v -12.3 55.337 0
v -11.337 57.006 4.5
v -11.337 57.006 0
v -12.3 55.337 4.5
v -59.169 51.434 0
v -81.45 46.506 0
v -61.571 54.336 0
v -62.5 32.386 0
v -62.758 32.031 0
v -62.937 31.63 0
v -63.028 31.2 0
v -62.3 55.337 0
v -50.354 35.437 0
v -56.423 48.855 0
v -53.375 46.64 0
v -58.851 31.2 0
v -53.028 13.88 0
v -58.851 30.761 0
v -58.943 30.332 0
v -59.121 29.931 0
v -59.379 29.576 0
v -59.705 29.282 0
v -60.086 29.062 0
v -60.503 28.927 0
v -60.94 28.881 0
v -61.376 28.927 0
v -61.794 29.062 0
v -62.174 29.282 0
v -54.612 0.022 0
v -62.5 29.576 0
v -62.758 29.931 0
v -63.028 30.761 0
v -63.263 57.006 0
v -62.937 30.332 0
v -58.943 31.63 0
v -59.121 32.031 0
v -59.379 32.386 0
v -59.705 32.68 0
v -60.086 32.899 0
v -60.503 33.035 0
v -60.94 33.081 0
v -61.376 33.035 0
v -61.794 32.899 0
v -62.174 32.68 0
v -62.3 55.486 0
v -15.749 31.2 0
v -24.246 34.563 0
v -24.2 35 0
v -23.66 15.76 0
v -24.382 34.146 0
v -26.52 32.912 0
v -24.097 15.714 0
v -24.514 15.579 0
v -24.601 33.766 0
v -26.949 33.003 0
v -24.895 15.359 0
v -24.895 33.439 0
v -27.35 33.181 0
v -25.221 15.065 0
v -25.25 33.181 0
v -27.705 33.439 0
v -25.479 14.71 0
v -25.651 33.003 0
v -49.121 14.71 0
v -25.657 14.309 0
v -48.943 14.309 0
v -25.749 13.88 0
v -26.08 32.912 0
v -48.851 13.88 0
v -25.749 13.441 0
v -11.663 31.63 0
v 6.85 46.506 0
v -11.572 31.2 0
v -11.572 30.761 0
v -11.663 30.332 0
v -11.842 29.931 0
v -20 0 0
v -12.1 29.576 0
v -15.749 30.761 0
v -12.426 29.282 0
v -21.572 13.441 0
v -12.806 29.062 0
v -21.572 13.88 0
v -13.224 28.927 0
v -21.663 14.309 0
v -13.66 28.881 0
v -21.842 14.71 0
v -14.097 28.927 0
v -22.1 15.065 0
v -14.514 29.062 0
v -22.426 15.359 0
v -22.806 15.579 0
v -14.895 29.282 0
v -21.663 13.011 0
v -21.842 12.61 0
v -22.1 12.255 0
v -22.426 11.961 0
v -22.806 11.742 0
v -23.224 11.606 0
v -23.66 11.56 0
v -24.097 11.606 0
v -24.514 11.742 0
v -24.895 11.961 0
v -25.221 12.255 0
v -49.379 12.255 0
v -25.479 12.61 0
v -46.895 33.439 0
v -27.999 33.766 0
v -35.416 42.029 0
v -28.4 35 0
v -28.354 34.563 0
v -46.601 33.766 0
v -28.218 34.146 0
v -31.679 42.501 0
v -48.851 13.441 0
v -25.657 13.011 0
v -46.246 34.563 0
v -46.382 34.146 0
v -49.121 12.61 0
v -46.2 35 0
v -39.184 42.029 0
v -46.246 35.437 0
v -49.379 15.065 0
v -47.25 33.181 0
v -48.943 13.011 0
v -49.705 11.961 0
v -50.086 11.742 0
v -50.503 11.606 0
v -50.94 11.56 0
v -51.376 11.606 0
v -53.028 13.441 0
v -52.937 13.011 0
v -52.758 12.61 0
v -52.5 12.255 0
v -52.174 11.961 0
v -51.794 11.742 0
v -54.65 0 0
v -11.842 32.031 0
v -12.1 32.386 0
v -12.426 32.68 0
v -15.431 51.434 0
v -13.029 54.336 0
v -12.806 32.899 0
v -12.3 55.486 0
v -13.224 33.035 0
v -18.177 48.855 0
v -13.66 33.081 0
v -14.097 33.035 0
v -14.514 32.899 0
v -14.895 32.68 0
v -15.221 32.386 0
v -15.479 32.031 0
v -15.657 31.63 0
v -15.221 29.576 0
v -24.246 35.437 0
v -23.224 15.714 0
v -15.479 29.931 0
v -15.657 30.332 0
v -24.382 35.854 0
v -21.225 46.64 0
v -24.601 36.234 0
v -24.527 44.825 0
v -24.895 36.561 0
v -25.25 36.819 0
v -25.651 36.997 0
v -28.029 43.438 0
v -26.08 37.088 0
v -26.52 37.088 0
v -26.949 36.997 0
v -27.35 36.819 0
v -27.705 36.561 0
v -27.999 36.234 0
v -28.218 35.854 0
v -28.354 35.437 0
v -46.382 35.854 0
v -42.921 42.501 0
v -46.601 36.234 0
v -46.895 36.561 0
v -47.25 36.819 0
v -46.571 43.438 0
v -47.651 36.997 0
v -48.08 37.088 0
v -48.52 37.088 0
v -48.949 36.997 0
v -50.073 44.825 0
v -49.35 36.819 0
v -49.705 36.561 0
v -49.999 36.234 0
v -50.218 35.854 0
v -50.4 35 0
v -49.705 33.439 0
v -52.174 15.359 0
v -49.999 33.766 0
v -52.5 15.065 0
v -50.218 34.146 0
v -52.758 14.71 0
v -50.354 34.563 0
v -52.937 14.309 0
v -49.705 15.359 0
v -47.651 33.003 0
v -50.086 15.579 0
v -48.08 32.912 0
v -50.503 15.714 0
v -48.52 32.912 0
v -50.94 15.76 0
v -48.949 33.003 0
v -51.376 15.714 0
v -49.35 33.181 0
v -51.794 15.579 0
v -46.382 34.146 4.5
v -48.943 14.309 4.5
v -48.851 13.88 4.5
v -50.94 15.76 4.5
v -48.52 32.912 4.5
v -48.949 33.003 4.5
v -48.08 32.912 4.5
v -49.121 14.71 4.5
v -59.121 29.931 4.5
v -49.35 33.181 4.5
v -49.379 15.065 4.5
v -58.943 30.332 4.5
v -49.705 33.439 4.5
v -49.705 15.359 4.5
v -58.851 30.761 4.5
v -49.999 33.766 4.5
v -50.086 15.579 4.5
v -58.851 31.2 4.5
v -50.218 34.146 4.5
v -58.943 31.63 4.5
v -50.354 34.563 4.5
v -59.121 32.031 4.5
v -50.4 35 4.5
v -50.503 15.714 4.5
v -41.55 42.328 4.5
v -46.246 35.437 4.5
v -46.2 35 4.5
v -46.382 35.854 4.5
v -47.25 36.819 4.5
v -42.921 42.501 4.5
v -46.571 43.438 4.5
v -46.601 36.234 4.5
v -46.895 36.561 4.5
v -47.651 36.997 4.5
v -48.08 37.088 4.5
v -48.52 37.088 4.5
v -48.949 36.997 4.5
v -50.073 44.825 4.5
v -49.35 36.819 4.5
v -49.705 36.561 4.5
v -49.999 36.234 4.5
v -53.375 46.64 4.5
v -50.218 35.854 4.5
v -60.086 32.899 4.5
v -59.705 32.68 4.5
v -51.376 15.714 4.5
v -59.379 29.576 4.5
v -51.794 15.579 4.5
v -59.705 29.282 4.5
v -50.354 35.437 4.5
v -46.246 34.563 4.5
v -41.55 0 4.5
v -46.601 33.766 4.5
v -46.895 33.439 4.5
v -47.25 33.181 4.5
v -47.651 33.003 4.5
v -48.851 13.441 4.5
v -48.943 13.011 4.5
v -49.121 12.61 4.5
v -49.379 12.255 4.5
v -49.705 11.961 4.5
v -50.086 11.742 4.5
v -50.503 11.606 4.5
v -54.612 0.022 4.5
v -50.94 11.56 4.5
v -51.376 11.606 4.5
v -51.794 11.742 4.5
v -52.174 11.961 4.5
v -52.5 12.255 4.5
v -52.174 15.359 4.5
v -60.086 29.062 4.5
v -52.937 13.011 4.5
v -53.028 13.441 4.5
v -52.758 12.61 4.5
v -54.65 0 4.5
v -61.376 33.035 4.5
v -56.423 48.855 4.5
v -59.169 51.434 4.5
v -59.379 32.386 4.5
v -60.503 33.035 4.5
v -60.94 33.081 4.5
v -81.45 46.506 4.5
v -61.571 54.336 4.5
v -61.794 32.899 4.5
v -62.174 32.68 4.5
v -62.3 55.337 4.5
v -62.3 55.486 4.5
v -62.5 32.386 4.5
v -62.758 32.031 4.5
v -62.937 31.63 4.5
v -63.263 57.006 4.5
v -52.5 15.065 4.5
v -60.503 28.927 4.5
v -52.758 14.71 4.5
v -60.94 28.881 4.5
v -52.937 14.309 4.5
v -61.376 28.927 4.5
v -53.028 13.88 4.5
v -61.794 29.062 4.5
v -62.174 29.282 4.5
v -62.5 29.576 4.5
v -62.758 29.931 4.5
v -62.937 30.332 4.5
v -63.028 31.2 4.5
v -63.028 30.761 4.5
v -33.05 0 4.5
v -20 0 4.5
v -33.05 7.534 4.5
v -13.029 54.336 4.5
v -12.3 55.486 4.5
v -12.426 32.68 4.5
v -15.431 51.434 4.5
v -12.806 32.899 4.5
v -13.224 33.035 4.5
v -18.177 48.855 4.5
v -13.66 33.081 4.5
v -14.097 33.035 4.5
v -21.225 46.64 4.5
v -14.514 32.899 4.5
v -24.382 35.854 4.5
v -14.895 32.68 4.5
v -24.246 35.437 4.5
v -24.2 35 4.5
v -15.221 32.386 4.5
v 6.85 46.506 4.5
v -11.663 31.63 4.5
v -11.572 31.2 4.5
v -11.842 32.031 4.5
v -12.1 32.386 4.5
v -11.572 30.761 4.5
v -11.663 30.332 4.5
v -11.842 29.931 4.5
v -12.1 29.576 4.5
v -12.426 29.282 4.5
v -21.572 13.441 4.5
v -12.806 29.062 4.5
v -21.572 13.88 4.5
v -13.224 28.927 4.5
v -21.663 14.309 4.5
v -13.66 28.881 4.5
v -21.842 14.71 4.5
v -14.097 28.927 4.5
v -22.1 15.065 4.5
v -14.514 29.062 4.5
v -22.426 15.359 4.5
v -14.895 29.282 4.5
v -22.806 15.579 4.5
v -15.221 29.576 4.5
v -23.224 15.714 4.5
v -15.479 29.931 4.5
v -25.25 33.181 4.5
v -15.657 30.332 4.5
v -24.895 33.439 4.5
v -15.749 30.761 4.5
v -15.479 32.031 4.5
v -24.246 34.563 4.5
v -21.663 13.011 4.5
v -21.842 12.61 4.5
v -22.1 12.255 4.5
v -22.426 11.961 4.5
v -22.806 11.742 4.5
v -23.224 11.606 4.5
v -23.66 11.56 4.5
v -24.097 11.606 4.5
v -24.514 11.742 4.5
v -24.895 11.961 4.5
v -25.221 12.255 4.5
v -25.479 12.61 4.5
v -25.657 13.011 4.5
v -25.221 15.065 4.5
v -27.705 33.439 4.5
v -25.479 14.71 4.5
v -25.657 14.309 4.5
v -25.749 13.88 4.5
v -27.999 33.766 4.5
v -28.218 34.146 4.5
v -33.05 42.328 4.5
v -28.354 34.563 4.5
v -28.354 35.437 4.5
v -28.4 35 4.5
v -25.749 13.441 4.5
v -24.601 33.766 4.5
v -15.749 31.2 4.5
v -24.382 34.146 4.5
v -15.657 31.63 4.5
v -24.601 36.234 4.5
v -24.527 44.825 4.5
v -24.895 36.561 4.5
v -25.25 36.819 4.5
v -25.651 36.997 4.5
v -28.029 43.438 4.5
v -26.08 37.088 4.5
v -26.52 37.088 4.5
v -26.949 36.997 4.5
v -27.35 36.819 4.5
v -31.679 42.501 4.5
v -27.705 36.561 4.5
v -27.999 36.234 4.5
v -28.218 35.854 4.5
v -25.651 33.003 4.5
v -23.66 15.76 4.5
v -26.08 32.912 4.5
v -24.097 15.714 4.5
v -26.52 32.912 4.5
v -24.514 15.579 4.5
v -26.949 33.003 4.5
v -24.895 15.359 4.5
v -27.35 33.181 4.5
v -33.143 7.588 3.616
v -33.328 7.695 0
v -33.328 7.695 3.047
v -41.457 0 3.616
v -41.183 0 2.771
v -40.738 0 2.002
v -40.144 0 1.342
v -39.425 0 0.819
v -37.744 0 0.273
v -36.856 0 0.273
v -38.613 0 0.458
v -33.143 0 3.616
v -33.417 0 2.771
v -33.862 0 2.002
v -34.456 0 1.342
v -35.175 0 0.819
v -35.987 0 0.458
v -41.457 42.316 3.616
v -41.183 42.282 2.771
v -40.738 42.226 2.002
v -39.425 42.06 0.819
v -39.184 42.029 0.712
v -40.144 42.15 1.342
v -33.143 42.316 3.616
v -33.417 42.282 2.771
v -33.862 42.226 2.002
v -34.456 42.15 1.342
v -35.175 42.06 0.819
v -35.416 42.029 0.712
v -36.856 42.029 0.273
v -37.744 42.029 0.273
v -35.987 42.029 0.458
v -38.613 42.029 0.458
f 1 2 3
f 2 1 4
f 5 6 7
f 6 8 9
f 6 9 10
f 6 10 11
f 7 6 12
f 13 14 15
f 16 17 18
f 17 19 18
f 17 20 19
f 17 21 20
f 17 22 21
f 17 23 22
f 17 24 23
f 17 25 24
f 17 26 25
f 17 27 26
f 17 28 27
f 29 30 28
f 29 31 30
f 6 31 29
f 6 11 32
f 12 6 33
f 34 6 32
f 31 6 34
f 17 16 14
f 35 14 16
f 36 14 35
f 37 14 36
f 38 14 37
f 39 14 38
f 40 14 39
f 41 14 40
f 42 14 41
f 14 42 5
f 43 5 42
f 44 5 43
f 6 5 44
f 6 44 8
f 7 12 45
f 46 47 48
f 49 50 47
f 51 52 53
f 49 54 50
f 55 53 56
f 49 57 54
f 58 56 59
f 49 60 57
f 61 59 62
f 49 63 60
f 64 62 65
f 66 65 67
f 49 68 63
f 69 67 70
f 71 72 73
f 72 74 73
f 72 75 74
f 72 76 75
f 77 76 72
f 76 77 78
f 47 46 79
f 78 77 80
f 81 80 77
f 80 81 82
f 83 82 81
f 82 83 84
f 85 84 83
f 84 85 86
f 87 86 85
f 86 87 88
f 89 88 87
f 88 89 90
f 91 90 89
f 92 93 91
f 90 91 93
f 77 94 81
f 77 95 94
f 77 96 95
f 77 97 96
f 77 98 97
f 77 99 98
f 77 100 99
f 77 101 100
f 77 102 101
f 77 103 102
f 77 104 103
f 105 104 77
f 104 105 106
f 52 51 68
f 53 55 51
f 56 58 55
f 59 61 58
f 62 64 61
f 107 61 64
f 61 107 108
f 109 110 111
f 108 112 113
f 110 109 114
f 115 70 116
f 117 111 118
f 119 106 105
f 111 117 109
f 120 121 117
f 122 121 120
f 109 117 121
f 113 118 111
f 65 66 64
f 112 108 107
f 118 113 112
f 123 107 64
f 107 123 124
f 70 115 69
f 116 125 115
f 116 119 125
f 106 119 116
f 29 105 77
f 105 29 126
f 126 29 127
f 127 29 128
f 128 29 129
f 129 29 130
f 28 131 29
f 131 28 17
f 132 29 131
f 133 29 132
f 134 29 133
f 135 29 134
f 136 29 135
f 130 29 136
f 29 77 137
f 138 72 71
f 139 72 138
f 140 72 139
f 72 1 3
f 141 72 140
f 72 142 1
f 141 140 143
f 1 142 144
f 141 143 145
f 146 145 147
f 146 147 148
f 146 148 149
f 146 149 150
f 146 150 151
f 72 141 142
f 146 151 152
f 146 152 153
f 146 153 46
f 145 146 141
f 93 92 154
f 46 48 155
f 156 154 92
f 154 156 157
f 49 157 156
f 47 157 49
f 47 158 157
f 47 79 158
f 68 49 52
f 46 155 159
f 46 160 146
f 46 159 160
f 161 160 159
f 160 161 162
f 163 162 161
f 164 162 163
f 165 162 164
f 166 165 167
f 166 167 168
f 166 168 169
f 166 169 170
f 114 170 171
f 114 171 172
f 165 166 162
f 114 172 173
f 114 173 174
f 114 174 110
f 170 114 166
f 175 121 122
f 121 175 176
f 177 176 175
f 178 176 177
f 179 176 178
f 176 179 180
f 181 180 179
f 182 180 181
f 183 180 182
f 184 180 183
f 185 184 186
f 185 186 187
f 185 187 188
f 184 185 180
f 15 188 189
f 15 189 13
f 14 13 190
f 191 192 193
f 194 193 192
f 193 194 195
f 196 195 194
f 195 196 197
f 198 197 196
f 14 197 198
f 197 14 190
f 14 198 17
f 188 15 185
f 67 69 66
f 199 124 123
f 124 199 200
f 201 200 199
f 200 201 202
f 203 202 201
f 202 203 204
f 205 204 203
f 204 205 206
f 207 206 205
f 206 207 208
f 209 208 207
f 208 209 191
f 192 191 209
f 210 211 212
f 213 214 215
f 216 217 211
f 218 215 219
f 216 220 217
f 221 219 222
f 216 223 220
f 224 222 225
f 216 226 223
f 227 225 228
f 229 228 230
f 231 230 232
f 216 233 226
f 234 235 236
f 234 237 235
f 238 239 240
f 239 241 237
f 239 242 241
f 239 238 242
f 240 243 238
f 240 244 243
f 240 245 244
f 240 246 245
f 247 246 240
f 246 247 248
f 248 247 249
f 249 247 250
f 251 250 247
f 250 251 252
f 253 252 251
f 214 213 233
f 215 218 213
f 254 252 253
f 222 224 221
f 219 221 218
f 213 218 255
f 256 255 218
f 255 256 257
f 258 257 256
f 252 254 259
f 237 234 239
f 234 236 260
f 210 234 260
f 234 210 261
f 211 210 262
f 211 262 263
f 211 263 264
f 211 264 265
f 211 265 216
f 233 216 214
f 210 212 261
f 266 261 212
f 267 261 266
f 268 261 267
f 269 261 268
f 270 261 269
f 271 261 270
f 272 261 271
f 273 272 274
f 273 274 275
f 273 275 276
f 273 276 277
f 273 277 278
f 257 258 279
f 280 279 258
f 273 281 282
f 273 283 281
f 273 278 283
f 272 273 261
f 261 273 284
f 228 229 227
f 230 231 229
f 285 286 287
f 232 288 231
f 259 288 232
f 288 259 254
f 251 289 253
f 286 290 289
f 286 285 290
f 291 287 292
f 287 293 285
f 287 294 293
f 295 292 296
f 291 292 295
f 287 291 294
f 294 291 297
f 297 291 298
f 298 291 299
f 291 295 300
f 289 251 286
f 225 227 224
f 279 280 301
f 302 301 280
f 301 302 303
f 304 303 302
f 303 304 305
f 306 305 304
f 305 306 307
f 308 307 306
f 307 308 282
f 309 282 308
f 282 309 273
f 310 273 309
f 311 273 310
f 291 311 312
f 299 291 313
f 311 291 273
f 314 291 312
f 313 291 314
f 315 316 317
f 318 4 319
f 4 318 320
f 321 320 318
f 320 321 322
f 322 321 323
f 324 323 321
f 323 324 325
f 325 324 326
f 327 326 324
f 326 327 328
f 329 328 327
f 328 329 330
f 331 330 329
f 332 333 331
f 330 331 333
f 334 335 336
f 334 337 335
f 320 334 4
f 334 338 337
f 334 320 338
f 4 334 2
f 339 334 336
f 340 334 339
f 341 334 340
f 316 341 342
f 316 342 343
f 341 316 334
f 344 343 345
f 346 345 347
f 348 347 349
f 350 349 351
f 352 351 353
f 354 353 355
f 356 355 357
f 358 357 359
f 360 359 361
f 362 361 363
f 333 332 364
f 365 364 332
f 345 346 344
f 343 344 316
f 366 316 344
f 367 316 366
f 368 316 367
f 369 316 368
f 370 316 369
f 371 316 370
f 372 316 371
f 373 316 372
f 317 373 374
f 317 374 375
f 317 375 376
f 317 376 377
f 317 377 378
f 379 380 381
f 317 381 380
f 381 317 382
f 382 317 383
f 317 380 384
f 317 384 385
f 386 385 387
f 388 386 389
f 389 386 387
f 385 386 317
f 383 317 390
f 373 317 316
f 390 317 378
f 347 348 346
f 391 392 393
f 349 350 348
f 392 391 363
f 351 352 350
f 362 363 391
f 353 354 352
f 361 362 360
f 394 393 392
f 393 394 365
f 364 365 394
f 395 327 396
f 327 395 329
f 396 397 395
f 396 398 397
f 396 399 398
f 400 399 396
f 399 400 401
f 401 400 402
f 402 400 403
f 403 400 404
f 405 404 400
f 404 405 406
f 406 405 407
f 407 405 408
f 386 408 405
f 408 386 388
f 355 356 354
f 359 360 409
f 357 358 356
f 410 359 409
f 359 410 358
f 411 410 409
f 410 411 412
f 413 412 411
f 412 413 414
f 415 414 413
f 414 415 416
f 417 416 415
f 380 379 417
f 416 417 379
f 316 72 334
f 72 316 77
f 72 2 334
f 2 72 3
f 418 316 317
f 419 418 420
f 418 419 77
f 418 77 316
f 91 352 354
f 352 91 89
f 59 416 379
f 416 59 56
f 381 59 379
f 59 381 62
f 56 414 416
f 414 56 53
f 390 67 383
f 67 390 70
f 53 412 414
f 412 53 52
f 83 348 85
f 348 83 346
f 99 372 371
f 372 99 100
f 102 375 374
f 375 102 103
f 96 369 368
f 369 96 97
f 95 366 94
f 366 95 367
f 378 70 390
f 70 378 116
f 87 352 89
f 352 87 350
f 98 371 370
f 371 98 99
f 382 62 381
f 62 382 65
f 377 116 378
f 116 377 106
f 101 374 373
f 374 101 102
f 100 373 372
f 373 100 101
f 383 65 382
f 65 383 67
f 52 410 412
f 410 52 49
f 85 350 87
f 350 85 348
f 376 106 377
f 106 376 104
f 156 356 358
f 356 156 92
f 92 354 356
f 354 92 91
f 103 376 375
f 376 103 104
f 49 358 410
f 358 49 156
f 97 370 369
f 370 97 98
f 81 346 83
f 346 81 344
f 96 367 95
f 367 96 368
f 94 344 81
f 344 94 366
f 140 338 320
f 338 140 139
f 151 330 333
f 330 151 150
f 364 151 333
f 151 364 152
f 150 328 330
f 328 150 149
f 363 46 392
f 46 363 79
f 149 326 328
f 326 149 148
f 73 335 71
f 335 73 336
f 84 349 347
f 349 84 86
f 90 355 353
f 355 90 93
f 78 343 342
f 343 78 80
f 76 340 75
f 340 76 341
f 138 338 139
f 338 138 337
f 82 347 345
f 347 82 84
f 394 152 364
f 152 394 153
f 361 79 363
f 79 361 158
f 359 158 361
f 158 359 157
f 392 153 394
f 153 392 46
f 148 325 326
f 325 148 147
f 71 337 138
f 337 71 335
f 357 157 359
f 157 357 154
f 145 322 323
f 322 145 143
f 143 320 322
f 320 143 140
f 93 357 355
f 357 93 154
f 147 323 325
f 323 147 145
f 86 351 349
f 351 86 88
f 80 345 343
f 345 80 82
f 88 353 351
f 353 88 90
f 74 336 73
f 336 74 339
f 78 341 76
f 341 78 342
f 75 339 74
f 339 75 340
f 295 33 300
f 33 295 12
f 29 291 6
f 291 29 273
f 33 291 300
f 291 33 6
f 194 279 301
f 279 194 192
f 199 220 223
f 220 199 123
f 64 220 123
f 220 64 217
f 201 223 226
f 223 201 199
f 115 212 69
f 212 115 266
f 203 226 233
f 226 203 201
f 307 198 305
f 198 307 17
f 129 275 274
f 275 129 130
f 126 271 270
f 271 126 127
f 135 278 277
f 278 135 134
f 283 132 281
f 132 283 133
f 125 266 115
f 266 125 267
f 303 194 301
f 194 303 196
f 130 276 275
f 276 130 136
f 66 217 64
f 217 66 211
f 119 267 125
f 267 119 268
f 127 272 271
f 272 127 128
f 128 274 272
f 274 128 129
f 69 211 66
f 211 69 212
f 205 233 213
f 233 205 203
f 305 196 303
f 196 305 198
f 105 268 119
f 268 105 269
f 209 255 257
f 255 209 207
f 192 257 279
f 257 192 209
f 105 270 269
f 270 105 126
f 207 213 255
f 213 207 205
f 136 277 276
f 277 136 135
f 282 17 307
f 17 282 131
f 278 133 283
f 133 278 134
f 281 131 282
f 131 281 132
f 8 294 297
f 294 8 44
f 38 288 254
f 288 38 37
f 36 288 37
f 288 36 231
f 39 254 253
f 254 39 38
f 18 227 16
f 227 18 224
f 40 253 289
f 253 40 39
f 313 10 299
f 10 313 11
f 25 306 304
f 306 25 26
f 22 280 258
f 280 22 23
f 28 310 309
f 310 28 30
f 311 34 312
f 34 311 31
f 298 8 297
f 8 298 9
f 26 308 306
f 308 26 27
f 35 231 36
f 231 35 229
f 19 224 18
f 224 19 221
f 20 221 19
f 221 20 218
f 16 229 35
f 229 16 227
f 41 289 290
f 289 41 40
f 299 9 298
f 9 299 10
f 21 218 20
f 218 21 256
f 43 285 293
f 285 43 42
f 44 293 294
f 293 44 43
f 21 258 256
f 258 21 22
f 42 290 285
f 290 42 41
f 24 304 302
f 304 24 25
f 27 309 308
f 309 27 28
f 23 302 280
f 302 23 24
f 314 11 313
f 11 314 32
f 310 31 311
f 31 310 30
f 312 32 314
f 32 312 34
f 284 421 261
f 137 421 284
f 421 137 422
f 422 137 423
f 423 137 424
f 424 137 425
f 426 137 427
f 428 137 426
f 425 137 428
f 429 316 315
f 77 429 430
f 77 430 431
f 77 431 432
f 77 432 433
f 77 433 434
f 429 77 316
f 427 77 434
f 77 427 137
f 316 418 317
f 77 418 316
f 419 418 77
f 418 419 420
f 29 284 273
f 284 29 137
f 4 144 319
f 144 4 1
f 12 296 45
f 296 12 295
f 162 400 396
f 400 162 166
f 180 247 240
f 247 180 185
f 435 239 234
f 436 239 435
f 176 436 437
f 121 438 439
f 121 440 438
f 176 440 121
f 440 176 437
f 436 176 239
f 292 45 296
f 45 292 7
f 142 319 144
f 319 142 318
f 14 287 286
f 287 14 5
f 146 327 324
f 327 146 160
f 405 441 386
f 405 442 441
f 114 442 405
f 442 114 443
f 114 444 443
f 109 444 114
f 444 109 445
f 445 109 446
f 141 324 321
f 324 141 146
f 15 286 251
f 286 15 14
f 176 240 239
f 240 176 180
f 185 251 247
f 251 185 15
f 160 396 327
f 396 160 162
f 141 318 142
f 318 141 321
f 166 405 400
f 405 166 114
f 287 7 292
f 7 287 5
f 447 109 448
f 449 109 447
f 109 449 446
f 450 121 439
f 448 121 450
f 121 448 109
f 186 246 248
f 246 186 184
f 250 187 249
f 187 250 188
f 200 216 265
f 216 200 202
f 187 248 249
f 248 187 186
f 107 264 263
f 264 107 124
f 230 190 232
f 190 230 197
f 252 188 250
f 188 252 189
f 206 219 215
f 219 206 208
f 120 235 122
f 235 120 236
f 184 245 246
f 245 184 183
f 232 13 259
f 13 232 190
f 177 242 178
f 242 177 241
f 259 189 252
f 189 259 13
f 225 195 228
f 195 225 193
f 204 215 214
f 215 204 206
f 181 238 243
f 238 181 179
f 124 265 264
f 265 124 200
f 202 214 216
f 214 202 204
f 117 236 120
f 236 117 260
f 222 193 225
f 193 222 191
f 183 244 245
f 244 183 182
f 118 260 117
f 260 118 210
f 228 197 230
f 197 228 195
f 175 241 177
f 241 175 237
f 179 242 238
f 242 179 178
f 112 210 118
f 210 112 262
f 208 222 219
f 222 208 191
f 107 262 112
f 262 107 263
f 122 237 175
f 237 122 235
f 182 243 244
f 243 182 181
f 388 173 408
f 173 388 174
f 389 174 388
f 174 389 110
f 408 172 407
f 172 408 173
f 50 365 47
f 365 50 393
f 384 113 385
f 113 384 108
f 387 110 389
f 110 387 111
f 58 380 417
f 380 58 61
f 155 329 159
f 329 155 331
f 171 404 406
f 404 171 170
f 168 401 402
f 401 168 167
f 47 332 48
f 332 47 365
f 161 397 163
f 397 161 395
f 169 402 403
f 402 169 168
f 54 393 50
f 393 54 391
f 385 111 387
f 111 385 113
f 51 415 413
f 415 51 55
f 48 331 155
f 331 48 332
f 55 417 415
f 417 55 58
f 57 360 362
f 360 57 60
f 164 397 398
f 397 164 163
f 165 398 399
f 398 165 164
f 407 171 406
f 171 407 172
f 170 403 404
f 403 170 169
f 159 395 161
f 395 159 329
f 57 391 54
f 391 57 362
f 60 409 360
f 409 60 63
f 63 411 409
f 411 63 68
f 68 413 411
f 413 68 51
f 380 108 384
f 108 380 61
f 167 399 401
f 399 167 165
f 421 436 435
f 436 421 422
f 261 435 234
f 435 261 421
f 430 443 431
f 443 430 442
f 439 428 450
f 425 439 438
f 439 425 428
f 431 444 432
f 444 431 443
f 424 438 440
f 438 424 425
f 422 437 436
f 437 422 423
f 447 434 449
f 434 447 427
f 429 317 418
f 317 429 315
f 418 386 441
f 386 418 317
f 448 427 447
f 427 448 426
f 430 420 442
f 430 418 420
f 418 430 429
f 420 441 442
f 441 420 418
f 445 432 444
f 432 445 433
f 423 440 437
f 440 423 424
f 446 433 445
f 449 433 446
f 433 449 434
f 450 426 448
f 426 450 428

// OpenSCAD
// file: functions.scad
// PRUSA Mendel  
// Functions used in many files
// GNU GPL v2
// Josef Průša
// josefprusa@me.com
// prusadjs.cz
// http://www.reprap.org/wiki/Prusa_Mendel
// http://github.com/prusajr/PrusaMendel

module nut(d,h,horizontal=true){
cornerdiameter =  (d / 2) / cos (180 / 6);
cylinder(h = h, r = cornerdiameter, $fn = 6);
if(horizontal){
for(i = [1:6]){
	rotate([0,0,60*i]) translate([-cornerdiameter-0.2,0,0]) rotate([0,0,-45]) cube(size = [2,2,h]);
}}
}

// By nophead
module polyhole(d,h) {
    n = max(round(2 * d),3);
    rotate([0,0,180])
        cylinder(h = h, r = (d / 2) / cos (180 / n), $fn = n);
}

module roundcorner(diameter){
	difference(){
		cube(size = [diameter,diameter,99], center = false);
		translate(v = [diameter, diameter, 0]) cylinder(h = 100, r=diameter, center=true);
	}
}
// file: metric.scad
// PRUSA Mendel  
// Default metric sizes
// GNU GPL v2
// Josef Průša
// josefprusa@me.com
// prusadjs.cz
// http://www.reprap.org/wiki/Prusa_Mendel
// http://github.com/prusajr/PrusaMendel

// DONT CHANGE THIS FILE! ALTER VALUES IN CONFIGURATION.SCAD INSTEAD

// RODS

threaded_rod_diameter = 8;
threaded_rod_diameter_horizontal = 8;
smooth_bar_diameter = 8;
smooth_bar_diameter_horizontal = 8;

// Nuts and bolts

m8_diameter = 8;
m8_nut_diameter = 14.5;

m4_diameter = 4;
m4_nut_diameter = 7.5;

m3_diameter = 3;
m3_nut_diameter = 5;

// Bushing holder

bushing_core_diameter = smooth_bar_diameter;
bushing_material_thickness = 1;

// Motors

motor_shaft = 5.1;
// file: configuration.scad
// PRUSA Mendel  
// Configuration file
// GNU GPL v2
// Josef Průša
// josefprusa@me.com
// prusadjs.cz
// http://www.reprap.org/wiki/Prusa_Mendel
// http://github.com/prusajr/PrusaMendel

// PLEASE SELECT ONE OF THE CONFIGURATIONS BELOW
// BY UN-COMMENTING IT

// Uncomment for metric settings
// METRIC METRIC METRIC METRIC METRIC METRIC METRIC METRIC 

include <metric.scad>;

// Uncomment for imperial settings
// IMPERIAL IMPERIAL IMPERIAL IMPERIAL IMPERIAL IMPERIAL IMPERIAL 

//include <sae.scad>;

//thin_wall = 3;
// LM8UU
//linear = false;

// override settings by customizing below
// CUSTOM CUSTOM CUSTOM CUSTOM CUSTOM CUSTOM CUSTOM CUSTOM CUSTOM

threaded_rod_diameter = 8.2;
threaded_rod_diameter_horizontal = 8.2;
smooth_bar_diameter = 8.3;
smooth_bar_diameter_horizontal = 8.3;

// Nuts and bolts

m8_diameter = 8.3;
m8_nut_diameter = 15;

m4_diameter = 4.2;
m4_nut_diameter = 9;

m3_diameter = 3.3;
m3_nut_diameter = 5.8;

///counted stuff
m3_nut_diameter_bigger = ((m3_nut_diameter  / 2) / cos (180 / 6))*2;

// functions 
include <functions.scad>
// main file
// C. Strang
// F. Beachler, Longevity Software LLC. d.b.a. Terawatt Industries

include <configuration.scad>;

$fn=30;

a = 30;								// parts angle
partthickness = 4 + 0.5;			// part thickness
screwdia = m4_diameter;	// hole diameter (i.e m3, m4, m5=5.1)
raildia = m8_diameter;
slottabs = -1;					// slot tab depth (2 normal, -1 remove)
o = 0.01;							// overlay for error free STLs

translate([0, 0, partthickness]) rotate([0, 180, 0]) prism60end_topvertex(slottabs, screwdia, partthickness, raildia);

module prism60end_topvertex(sl, sc, pa, rd)
{
	difference() {
		union() {
			translate([20,0,0]) rotate([0,0,a]) rail(sl,sc,pa, rd);
			translate([54.60,0,0]) rotate([0,0,-a]) mirror([1,0,0]) rail(sl,sc,pa);
			translate([20,0,0]) rotate([0,0,0]) base1(pa);
			translate([57.3,44.65,0]) rotate([0,0,180]) base2(pa);
		}
		// smooth rail
		translate([57.3 - 20, 60 / 2 + 20, 0]) rotate([90, 0, 0]) cylinder(r=rd / 2 + 0.1, h=60, $fn=30);
		translate([0, 10, 0]) {
			// m4 screw holes
			translate([57.3 - 20 + 11, 25, -o]) cylinder(r = m4_diameter / 2, h=pa + 5);
			translate([57.3 - 20 - 11, 25, -o]) cylinder(r = m4_diameter / 2, h=pa + 5);
		}
	}
}

module base1(th)
{
	difference()
	{
		cube([34.65,13,th]);
		translate([0,0,-o]) rotate([0,0,a]) cube([34.65,13,th+(2*o)]);
		translate([34.65,0,-o]) rotate([0,0,(90-a)]) cube([13,34.65,th+2*o]);
	}
}

module base2(th)
{
	difference()
	{
		translate([-5, -15, 0]) cube([50.0, 55, th]);
		translate([-10, -10, -o]) rotate([0,0,61]) cube([60, 25, th+2*o]);
		translate([50.0, -10, -o]) rotate([0,0,29]) cube([25, 60, th+2*o]);
		translate([20.0,-27.32,-o]) rotate([0,0,0]) cylinder(r=30,h=th+2*o,$fn=50);
	}
}


module rail(st,sd,th)
{
	difference()
	{
		cube([21, 53.7, th]);
		translate([10,10,-o]) cylinder(r=sd/2,h=2*o+th);
 		translate([10,30,-o]) cylinder(r=sd/2,h=2*o+th);
	}
//	translate([7.5,1,th-o]) cube([5,6.0,st+o]);
//	translate([7.5,13,th-o]) cube([5,14,st+o]);
//	translate([7.5,33,th-o]) cube([5,7,st+o]);

}
